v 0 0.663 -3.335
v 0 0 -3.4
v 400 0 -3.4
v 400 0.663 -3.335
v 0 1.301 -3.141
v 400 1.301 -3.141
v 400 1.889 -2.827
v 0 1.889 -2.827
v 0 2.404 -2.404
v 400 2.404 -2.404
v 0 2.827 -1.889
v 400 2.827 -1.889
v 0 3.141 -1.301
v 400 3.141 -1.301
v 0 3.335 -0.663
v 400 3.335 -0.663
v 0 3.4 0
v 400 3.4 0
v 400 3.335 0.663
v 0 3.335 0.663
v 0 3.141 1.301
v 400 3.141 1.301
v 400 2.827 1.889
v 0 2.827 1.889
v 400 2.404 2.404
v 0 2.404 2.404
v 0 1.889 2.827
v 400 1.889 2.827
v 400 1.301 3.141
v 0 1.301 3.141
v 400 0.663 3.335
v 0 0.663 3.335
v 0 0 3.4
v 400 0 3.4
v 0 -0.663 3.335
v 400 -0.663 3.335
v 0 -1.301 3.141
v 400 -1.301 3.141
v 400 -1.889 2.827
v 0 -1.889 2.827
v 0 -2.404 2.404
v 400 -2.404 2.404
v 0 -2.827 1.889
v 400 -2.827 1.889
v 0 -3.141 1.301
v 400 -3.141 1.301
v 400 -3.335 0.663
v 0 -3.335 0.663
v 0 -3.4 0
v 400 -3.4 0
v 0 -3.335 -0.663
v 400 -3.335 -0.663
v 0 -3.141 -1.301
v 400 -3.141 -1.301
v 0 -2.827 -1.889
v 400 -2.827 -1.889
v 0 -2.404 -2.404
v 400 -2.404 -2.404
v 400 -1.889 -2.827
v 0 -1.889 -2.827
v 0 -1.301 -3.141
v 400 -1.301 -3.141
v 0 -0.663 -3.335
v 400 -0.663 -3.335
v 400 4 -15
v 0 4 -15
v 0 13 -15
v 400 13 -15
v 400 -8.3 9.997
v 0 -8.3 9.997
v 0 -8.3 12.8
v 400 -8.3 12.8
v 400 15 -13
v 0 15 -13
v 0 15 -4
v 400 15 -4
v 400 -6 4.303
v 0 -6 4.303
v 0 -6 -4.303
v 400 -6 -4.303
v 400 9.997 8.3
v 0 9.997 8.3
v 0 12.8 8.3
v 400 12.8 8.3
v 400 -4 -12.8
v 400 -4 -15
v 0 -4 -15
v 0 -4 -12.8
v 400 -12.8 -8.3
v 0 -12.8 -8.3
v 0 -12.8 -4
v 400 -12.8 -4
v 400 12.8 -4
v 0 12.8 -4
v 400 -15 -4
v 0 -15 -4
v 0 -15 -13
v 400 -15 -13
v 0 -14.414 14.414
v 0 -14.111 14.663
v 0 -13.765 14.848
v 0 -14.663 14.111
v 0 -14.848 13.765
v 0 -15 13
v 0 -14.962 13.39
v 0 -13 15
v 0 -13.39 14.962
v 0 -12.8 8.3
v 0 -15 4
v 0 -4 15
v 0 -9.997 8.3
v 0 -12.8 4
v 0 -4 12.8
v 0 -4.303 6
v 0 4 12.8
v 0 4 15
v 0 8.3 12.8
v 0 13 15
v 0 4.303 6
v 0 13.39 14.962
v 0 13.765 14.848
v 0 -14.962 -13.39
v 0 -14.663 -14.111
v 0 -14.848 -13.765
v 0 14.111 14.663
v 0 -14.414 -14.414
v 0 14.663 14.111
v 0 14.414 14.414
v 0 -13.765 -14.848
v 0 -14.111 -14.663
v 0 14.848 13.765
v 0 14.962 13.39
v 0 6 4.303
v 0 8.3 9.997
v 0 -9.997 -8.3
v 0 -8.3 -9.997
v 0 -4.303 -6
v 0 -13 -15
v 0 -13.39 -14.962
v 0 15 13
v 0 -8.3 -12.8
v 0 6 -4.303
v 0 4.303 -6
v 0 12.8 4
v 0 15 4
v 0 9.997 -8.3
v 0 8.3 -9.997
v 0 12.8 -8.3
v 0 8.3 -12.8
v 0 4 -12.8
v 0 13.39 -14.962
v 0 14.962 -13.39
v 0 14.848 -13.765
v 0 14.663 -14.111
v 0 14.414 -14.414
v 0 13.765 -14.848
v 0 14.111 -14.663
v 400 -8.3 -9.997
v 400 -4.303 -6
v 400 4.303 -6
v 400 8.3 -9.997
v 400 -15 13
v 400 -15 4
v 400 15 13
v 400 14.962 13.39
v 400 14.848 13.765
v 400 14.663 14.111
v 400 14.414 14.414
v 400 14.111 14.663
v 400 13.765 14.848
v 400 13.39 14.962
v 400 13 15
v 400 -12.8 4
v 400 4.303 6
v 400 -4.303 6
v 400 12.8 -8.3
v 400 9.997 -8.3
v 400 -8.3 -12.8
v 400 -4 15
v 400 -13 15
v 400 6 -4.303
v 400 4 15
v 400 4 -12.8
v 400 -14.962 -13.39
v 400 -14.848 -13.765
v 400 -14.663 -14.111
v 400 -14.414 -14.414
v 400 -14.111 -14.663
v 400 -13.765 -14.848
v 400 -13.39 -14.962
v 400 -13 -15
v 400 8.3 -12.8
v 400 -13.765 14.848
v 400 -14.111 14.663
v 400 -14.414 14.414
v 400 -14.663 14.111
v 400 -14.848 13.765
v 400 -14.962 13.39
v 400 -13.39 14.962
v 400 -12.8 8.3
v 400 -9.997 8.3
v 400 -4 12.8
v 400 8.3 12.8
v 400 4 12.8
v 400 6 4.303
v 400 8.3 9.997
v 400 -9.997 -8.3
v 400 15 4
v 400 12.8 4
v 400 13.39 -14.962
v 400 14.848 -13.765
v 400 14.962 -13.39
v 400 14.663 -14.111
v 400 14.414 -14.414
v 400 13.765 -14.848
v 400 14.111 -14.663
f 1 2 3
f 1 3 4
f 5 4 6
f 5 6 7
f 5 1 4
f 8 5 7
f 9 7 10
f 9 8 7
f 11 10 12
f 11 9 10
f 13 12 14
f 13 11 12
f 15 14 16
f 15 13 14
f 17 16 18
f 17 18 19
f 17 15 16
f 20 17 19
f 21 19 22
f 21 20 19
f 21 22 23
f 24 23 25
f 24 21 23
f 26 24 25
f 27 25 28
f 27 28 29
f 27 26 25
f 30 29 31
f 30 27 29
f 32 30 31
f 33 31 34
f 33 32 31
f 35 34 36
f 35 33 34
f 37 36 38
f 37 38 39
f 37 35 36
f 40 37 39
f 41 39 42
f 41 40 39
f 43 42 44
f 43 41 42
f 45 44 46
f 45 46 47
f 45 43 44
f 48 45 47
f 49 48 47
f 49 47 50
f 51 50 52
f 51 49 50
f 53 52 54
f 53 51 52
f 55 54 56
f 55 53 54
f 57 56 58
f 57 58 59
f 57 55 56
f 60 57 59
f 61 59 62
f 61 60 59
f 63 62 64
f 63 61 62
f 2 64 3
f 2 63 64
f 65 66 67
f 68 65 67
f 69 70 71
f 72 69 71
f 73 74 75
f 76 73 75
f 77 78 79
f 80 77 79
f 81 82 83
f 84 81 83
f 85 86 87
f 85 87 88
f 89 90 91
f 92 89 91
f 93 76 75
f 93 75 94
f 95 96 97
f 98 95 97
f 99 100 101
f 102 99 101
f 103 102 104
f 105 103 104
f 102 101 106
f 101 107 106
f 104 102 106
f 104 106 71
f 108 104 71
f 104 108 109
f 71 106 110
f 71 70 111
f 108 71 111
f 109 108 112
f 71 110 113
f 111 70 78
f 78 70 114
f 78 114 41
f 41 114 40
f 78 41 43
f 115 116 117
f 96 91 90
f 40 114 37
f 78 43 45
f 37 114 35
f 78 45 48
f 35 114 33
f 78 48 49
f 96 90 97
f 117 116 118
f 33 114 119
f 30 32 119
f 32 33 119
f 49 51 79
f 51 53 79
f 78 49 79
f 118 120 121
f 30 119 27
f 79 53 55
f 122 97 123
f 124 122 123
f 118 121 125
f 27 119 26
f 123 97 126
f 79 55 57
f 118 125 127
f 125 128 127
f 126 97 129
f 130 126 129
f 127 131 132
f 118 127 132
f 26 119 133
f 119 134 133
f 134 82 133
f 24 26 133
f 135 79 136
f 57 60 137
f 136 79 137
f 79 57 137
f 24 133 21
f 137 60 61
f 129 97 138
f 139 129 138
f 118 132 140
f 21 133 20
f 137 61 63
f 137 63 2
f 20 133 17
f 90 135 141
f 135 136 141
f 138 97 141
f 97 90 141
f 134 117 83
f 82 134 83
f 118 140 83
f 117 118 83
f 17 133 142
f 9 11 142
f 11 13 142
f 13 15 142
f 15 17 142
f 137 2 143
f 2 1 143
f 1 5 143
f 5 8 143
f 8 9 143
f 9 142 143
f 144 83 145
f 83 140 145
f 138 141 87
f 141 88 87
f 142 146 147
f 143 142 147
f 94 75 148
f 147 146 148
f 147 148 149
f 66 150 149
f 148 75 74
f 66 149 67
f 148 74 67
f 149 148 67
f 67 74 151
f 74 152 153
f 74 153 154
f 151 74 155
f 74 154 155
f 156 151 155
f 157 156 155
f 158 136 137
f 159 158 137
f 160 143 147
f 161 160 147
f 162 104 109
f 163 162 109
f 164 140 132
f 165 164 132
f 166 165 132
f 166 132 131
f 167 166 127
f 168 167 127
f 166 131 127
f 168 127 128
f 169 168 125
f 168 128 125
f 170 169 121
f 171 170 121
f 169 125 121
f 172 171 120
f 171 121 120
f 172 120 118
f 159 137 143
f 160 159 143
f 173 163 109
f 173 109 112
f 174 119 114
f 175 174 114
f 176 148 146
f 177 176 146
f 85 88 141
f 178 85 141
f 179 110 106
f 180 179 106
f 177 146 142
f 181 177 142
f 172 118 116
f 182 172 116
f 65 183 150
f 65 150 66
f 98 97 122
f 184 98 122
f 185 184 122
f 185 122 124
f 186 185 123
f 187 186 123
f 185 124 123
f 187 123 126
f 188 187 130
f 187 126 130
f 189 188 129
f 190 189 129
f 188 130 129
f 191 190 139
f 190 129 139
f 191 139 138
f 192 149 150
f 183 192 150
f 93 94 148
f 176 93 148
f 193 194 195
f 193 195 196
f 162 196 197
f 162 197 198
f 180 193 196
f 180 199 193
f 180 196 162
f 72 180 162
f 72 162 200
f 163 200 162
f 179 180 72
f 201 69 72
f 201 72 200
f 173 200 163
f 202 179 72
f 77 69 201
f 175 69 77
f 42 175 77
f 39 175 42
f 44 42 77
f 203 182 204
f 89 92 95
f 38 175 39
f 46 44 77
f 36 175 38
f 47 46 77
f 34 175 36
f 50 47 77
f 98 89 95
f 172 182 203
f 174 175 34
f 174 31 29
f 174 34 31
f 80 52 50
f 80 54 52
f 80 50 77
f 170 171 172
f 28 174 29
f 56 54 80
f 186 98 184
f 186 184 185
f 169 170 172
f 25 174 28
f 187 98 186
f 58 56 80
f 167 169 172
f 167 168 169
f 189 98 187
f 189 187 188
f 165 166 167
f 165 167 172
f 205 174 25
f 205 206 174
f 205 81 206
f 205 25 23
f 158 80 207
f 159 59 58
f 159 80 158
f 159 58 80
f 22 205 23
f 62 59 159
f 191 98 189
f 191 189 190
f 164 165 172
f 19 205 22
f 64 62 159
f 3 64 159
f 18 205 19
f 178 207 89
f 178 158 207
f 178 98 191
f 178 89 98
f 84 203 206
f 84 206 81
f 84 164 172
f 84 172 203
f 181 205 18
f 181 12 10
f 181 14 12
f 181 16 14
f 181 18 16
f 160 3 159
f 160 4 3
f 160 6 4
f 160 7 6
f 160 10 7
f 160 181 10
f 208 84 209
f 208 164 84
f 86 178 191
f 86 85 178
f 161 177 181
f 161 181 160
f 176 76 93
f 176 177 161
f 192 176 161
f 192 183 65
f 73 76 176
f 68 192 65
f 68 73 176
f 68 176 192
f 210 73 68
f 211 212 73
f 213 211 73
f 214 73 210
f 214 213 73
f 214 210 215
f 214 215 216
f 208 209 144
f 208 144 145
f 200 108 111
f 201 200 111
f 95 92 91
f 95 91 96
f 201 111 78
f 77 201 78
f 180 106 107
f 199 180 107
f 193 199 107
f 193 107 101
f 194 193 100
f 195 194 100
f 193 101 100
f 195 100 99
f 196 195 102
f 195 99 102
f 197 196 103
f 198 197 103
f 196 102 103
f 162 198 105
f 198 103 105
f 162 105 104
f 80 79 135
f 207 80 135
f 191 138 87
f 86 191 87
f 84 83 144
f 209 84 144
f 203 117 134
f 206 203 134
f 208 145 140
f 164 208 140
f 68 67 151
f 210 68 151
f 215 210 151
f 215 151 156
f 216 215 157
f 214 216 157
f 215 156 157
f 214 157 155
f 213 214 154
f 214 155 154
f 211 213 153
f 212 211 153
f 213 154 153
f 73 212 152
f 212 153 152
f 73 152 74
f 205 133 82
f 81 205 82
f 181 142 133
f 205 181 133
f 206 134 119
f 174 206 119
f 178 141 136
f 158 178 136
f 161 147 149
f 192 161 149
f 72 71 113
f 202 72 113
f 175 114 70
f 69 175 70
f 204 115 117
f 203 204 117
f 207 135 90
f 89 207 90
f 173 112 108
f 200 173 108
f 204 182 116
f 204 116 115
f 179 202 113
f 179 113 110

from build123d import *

# Parameters (mm, degrees)
SKETCH17_R                       = 3.4
ALUMINIUM_EXTRUSION_3030_1_DEPTH = 400


with BuildPart() as part:
    # Sketch17 → Aluminium extrusion 3030(1) (new body)
    with BuildSketch(Plane(origin=(0, 0, 0), x_dir=(0, 0, -1), z_dir=(1, 0, 0))):
        with BuildLine():
            Line((0, 6), (-4.302943725, 6))
            Line((-4.302943725, 6), (-8.3, 9.997056275))
            Line((-8.3, 9.997056275), (-8.3, 12.8))
            Line((-8.3, 12.8), (-4, 12.8))
            Line((-4, 12.8), (-4, 15))
            Line((-4, 15), (-13, 15))
            ThreePointArc((-13, 15), (-14.414213562, 14.414213562), (-15, 13))
            Line((-15, 13), (-15, 4))
            Line((-15, 4), (-12.8, 4))
            Line((-12.8, 4), (-12.8, 8.3))
            Line((-12.8, 8.3), (-9.997056275, 8.3))
            Line((-9.997056275, 8.3), (-6, 4.302943725))
            Line((-6, 4.302943725), (-6, 0))
            Line((-6, 0), (-6, -4.302943725))
            Line((-6, -4.302943725), (-9.997056275, -8.3))
            Line((-9.997056275, -8.3), (-12.8, -8.3))
            Line((-12.8, -8.3), (-12.8, -4))
            Line((-12.8, -4), (-15, -4))
            Line((-15, -4), (-15, -13))
            ThreePointArc((-15, -13), (-14.414213562, -14.414213562), (-13, -15))
            Line((-13, -15), (-4, -15))
            Line((-4, -15), (-4, -12.8))
            Line((-4, -12.8), (-8.3, -12.8))
            Line((-8.3, -12.8), (-8.3, -9.997056275))
            Line((-8.3, -9.997056275), (-4.302943725, -6))
            Line((-4.302943725, -6), (0, -6))
            Line((0, -6), (4.302943725, -6))
            Line((4.302943725, -6), (8.3, -9.997056275))
            Line((8.3, -9.997056275), (8.3, -12.8))
            Line((8.3, -12.8), (4, -12.8))
            Line((4, -12.8), (4, -15))
            Line((4, -15), (13, -15))
            ThreePointArc((13, -15), (14.414213562, -14.414213562), (15, -13))
            Line((15, -13), (15, -4))
            Line((15, -4), (12.8, -4))
            Line((12.8, -4), (12.8, -8.3))
            Line((12.8, -8.3), (9.997056275, -8.3))
            Line((9.997056275, -8.3), (6, -4.302943725))
            Line((6, -4.302943725), (6, 0))
            Line((6, 0), (6, 4.302943725))
            Line((6, 4.302943725), (9.997056275, 8.3))
            Line((9.997056275, 8.3), (12.8, 8.3))
            Line((12.8, 8.3), (12.8, 4))
            Line((12.8, 4), (15, 4))
            Line((15, 4), (15, 13))
            ThreePointArc((15, 13), (14.414213562, 14.414213562), (13, 15))
            Line((13, 15), (4, 15))
            Line((4, 15), (4, 12.8))
            Line((4, 12.8), (8.3, 12.8))
            Line((8.3, 12.8), (8.3, 9.997056275))
            Line((8.3, 9.997056275), (4.302943725, 6))
            Line((4.302943725, 6), (0, 6))
        make_face()
        Circle(SKETCH17_R, mode=Mode.SUBTRACT)
    extrude(amount=ALUMINIUM_EXTRUSION_3030_1_DEPTH)


solid = part.part
